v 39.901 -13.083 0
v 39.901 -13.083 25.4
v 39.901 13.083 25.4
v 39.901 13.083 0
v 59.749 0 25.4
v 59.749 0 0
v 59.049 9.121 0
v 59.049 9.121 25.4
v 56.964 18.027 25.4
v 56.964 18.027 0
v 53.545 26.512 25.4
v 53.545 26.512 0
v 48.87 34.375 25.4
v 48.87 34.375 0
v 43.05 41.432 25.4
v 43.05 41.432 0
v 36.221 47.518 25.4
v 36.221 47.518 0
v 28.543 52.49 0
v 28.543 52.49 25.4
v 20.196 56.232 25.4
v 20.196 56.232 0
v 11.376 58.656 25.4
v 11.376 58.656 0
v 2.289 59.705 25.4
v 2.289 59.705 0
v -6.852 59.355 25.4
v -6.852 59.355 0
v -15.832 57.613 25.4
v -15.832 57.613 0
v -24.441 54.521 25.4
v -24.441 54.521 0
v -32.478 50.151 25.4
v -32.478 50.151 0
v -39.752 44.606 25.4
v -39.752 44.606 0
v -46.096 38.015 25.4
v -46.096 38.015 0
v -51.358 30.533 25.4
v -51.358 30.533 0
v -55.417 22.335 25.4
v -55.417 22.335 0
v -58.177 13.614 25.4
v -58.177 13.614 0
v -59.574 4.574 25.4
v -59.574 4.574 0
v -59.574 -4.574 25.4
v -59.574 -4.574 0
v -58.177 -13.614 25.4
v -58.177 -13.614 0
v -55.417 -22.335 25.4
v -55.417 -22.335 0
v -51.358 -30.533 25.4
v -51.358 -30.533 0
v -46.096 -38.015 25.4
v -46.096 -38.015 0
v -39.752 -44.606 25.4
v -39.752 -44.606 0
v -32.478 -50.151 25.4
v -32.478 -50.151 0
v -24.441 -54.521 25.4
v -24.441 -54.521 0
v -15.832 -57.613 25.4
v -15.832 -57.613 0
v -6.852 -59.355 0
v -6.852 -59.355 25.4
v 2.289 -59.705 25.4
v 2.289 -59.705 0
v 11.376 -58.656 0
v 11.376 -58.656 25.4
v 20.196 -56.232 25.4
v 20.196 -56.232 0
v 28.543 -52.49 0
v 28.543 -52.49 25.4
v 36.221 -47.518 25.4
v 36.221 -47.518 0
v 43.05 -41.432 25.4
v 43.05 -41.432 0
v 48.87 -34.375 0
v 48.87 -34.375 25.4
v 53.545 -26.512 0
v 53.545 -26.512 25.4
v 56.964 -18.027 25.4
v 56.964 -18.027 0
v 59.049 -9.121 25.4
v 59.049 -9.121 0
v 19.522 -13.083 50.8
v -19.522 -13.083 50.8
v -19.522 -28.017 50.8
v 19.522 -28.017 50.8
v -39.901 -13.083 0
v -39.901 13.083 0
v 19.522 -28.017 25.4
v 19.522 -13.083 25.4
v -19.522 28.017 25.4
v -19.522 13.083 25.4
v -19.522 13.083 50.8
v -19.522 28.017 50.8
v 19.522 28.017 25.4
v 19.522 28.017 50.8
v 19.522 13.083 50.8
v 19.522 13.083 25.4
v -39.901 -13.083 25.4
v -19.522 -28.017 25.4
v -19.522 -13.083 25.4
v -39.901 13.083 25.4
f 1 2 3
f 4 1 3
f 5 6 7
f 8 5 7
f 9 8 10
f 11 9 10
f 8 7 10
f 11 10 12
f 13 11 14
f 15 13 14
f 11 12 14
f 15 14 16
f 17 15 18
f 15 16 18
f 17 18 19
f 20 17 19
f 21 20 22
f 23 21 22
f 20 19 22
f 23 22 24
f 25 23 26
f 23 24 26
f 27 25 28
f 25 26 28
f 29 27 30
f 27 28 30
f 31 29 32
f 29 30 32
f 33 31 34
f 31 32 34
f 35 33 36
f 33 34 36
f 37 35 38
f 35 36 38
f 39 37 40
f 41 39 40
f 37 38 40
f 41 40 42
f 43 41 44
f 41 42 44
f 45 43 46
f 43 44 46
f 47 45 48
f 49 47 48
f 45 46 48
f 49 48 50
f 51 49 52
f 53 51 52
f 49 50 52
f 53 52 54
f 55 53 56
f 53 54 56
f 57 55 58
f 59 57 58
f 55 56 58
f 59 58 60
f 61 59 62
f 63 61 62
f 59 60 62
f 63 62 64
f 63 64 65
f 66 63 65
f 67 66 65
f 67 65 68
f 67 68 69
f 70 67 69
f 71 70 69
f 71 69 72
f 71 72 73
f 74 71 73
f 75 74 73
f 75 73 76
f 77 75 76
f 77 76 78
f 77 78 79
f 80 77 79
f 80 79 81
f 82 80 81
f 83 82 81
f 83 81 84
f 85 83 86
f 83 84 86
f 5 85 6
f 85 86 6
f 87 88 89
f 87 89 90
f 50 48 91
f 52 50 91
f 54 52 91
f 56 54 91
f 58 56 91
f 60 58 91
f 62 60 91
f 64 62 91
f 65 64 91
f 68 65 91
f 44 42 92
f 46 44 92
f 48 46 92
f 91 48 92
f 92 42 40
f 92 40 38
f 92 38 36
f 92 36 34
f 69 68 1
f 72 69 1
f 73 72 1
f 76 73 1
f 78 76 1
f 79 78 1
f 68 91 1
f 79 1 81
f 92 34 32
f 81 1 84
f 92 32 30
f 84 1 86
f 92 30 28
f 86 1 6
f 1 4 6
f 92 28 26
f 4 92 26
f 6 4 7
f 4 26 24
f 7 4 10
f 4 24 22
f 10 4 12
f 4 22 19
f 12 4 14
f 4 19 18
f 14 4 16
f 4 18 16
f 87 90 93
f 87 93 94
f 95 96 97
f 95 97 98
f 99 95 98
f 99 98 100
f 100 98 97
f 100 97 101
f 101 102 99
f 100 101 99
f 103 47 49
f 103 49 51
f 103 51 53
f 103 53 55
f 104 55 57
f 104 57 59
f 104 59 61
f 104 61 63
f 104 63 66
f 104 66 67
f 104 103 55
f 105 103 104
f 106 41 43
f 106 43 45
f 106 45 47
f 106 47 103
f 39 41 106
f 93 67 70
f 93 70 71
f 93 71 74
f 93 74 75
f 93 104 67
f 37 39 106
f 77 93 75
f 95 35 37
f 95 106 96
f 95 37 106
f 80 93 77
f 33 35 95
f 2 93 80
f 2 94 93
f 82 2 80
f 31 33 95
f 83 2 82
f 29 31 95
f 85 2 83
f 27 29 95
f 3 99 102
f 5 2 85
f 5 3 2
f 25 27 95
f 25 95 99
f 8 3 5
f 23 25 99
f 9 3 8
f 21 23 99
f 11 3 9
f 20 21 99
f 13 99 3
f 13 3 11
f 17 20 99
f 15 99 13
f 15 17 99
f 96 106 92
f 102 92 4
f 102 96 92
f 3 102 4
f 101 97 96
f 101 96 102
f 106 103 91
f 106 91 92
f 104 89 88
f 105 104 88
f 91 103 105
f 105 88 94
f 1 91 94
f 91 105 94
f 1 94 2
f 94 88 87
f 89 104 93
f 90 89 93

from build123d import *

# Parameters (mm, degrees)
F0_R     = 59.748892
F1_DEPTH = 25.4
F2_W     = 39.043996
F2_H     = 56.034788
F3_DEPTH = 25.4
F4_W     = 21.79923
F4_H     = 26.16598
F5_DEPTH = 50.8
F6_W     = 79.802156
F6_H     = 26.16598
F7_DEPTH = 50.801


with BuildPart() as f1:
    # F0 (on Top) → F1 (new body)
    with BuildSketch(Plane.XY):
        Circle(F0_R)
    extrude(amount=F1_DEPTH)

    # F2 (on face) → F3 (join)
    with BuildSketch(Plane.XY.offset(25.4)):
        Rectangle(F2_W, F2_H)
    extrude(amount=F3_DEPTH)

    # F4 (on face) → F5 (cut, through all)
    with BuildSketch(Plane.XY.offset(50.8)):
        Rectangle(F4_W, F4_H)
    extrude(amount=-F5_DEPTH, mode=Mode.SUBTRACT)

    # F6 (on face) → F7 (cut, through all)
    with BuildSketch(Plane.XY.offset(50.8)):
        Rectangle(F6_W, F6_H)
    extrude(amount=-F7_DEPTH, mode=Mode.SUBTRACT)


solid = f1.part
